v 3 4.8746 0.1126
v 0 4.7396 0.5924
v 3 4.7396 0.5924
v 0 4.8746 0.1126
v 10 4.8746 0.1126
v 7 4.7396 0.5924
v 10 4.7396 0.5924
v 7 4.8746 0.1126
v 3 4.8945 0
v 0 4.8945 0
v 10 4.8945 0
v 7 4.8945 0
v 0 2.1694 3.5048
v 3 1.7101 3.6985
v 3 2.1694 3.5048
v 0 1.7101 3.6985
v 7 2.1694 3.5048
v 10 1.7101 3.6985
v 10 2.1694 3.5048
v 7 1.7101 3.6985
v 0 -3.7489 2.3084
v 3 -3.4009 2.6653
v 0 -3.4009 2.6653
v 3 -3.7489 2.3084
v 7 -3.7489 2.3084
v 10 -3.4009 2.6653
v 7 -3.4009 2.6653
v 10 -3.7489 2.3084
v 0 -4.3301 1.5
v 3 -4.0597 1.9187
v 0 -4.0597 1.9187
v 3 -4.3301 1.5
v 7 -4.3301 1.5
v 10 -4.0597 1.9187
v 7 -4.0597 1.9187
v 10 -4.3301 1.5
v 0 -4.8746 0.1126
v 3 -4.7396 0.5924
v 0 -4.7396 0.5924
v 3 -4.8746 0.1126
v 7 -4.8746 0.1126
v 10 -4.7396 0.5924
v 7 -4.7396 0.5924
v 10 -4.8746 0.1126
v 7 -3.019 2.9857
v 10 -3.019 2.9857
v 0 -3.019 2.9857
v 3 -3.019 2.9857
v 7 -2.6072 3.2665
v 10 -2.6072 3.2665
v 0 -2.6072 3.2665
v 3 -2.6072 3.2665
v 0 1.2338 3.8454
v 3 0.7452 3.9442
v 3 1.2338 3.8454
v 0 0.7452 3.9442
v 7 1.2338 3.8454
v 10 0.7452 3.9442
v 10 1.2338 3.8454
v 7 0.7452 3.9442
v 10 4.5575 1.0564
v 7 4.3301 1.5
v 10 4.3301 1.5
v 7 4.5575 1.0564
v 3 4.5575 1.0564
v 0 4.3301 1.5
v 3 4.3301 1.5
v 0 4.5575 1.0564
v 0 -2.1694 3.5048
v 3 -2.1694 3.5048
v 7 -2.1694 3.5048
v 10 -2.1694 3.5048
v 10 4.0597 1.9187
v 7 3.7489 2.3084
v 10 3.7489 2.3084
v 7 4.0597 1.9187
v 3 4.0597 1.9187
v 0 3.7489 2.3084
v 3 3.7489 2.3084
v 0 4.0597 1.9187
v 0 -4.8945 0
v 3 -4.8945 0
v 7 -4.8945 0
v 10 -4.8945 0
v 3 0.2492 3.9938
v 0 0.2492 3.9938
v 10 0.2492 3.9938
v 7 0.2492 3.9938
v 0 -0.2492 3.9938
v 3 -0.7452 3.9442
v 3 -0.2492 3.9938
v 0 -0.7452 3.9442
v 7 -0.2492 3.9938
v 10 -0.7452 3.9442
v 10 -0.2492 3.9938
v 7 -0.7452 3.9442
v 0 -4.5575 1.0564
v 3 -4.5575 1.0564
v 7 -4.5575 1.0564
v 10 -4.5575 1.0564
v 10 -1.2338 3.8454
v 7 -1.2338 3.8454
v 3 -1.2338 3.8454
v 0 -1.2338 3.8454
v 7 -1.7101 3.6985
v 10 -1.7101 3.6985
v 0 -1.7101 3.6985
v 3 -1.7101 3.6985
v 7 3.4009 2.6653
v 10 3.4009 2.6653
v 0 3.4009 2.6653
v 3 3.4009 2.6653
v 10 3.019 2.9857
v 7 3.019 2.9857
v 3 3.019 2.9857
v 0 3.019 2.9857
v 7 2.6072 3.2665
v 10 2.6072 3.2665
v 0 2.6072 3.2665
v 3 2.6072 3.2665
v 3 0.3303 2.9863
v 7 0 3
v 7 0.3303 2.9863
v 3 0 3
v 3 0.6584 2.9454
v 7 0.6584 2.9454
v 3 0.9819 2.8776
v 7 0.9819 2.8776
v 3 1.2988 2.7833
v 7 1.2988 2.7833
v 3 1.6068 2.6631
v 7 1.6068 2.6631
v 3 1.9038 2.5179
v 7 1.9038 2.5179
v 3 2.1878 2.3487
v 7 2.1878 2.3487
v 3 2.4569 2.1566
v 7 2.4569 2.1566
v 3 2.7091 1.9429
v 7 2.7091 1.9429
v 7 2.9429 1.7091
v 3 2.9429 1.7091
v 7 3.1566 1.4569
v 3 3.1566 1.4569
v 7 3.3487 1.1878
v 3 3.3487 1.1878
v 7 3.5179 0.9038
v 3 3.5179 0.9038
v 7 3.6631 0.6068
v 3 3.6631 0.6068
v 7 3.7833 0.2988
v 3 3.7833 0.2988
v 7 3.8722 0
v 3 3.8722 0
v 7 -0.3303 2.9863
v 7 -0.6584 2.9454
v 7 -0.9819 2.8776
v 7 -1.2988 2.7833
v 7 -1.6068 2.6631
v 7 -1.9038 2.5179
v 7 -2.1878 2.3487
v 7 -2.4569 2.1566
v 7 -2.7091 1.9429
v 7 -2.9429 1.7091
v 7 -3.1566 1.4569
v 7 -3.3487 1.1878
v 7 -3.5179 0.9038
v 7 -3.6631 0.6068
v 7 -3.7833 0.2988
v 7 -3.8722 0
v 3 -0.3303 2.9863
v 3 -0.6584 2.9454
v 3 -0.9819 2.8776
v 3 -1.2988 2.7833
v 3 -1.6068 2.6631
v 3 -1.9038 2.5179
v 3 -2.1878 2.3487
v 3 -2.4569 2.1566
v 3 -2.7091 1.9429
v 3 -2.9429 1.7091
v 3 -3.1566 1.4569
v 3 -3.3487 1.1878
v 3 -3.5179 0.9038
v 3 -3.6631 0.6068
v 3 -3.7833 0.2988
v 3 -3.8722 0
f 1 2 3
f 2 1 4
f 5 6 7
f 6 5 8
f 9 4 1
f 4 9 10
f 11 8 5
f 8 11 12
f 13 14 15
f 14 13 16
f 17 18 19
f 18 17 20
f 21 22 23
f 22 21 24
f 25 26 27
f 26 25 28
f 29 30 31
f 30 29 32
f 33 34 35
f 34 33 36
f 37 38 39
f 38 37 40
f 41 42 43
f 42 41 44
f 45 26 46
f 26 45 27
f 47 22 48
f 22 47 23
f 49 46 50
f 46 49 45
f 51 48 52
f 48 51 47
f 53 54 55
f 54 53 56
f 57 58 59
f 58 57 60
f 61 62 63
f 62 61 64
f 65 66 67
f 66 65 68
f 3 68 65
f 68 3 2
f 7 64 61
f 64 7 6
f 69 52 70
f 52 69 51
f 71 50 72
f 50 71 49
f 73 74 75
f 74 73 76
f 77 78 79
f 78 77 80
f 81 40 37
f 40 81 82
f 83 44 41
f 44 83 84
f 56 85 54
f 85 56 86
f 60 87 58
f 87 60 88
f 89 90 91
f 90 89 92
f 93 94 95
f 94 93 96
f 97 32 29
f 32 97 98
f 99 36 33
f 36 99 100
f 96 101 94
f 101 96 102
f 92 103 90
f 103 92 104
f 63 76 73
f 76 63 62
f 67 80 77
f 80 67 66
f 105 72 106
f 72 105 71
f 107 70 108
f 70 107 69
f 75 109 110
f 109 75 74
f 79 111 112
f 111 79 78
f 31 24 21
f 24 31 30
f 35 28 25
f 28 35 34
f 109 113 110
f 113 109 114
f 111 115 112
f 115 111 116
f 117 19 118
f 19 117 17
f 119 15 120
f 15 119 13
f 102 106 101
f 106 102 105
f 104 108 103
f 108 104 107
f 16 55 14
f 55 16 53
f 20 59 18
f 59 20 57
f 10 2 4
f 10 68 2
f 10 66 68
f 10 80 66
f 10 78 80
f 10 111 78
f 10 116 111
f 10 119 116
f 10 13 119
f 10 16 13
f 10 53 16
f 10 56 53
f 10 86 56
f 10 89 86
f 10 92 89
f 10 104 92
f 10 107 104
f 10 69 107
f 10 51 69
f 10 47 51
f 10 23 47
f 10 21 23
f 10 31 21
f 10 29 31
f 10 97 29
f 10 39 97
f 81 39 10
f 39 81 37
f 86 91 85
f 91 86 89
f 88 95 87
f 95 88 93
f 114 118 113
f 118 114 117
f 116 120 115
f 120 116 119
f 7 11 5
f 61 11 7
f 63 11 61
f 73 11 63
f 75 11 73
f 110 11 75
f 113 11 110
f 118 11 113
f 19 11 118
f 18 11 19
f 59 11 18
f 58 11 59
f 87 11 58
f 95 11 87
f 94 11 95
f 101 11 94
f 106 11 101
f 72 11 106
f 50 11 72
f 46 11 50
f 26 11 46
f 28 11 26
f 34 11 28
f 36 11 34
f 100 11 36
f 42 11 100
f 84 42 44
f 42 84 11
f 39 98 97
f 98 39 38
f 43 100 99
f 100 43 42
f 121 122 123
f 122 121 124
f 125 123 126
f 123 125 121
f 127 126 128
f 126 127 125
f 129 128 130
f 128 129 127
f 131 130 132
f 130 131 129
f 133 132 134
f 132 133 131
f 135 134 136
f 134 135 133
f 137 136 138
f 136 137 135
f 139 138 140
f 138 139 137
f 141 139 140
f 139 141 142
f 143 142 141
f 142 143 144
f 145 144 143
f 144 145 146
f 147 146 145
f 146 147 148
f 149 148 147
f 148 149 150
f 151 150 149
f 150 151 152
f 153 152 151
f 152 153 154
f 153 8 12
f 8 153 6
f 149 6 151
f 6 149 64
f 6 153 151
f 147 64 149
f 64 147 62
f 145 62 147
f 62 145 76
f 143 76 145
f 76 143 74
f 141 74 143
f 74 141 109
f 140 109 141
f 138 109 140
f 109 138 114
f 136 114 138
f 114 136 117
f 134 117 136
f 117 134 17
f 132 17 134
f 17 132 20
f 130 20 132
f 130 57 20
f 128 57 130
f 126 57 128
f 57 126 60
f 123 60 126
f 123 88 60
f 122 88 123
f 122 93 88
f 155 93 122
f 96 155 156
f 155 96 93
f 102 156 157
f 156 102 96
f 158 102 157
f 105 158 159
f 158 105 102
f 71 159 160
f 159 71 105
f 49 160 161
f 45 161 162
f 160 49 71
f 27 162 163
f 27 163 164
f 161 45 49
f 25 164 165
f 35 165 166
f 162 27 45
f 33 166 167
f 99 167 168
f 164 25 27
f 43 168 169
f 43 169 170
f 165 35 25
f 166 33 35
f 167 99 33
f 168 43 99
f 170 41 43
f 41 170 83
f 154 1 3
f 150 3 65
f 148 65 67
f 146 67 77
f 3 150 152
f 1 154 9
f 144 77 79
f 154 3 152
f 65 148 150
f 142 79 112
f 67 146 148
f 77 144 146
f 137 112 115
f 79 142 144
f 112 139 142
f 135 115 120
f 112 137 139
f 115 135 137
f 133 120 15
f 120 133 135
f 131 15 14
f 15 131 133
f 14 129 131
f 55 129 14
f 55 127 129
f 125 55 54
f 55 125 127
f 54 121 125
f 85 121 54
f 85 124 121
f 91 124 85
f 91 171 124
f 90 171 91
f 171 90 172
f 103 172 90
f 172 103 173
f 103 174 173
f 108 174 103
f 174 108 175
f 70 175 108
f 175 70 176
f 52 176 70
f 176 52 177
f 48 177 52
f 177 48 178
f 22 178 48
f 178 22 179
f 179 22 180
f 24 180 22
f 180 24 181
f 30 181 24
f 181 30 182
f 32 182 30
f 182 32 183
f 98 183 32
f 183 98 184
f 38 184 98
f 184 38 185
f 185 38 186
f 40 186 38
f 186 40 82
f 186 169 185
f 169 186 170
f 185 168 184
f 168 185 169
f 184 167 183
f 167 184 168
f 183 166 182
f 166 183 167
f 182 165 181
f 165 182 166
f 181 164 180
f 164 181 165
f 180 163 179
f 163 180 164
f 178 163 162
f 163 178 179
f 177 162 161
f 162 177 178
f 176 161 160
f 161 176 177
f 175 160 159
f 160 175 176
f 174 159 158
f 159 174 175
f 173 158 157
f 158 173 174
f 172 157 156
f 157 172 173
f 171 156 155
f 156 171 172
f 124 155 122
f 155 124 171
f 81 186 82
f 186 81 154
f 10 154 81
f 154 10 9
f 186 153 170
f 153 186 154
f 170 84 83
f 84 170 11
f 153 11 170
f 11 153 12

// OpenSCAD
$fs=0.5;
$fa=4;
 echo("Version:",version());
difference () {
    
        translate([0,0,-1])rotate ([0,90,0])cylinder (d=10,h=10);
        translate([0,0,-1])rotate ([0,90,0])translate ([0,0,3])rotate_extrude ()translate ([4,0])square ([2,4]);
   translate ([5,0,-5])cube([12,12,10],center=true);
}
